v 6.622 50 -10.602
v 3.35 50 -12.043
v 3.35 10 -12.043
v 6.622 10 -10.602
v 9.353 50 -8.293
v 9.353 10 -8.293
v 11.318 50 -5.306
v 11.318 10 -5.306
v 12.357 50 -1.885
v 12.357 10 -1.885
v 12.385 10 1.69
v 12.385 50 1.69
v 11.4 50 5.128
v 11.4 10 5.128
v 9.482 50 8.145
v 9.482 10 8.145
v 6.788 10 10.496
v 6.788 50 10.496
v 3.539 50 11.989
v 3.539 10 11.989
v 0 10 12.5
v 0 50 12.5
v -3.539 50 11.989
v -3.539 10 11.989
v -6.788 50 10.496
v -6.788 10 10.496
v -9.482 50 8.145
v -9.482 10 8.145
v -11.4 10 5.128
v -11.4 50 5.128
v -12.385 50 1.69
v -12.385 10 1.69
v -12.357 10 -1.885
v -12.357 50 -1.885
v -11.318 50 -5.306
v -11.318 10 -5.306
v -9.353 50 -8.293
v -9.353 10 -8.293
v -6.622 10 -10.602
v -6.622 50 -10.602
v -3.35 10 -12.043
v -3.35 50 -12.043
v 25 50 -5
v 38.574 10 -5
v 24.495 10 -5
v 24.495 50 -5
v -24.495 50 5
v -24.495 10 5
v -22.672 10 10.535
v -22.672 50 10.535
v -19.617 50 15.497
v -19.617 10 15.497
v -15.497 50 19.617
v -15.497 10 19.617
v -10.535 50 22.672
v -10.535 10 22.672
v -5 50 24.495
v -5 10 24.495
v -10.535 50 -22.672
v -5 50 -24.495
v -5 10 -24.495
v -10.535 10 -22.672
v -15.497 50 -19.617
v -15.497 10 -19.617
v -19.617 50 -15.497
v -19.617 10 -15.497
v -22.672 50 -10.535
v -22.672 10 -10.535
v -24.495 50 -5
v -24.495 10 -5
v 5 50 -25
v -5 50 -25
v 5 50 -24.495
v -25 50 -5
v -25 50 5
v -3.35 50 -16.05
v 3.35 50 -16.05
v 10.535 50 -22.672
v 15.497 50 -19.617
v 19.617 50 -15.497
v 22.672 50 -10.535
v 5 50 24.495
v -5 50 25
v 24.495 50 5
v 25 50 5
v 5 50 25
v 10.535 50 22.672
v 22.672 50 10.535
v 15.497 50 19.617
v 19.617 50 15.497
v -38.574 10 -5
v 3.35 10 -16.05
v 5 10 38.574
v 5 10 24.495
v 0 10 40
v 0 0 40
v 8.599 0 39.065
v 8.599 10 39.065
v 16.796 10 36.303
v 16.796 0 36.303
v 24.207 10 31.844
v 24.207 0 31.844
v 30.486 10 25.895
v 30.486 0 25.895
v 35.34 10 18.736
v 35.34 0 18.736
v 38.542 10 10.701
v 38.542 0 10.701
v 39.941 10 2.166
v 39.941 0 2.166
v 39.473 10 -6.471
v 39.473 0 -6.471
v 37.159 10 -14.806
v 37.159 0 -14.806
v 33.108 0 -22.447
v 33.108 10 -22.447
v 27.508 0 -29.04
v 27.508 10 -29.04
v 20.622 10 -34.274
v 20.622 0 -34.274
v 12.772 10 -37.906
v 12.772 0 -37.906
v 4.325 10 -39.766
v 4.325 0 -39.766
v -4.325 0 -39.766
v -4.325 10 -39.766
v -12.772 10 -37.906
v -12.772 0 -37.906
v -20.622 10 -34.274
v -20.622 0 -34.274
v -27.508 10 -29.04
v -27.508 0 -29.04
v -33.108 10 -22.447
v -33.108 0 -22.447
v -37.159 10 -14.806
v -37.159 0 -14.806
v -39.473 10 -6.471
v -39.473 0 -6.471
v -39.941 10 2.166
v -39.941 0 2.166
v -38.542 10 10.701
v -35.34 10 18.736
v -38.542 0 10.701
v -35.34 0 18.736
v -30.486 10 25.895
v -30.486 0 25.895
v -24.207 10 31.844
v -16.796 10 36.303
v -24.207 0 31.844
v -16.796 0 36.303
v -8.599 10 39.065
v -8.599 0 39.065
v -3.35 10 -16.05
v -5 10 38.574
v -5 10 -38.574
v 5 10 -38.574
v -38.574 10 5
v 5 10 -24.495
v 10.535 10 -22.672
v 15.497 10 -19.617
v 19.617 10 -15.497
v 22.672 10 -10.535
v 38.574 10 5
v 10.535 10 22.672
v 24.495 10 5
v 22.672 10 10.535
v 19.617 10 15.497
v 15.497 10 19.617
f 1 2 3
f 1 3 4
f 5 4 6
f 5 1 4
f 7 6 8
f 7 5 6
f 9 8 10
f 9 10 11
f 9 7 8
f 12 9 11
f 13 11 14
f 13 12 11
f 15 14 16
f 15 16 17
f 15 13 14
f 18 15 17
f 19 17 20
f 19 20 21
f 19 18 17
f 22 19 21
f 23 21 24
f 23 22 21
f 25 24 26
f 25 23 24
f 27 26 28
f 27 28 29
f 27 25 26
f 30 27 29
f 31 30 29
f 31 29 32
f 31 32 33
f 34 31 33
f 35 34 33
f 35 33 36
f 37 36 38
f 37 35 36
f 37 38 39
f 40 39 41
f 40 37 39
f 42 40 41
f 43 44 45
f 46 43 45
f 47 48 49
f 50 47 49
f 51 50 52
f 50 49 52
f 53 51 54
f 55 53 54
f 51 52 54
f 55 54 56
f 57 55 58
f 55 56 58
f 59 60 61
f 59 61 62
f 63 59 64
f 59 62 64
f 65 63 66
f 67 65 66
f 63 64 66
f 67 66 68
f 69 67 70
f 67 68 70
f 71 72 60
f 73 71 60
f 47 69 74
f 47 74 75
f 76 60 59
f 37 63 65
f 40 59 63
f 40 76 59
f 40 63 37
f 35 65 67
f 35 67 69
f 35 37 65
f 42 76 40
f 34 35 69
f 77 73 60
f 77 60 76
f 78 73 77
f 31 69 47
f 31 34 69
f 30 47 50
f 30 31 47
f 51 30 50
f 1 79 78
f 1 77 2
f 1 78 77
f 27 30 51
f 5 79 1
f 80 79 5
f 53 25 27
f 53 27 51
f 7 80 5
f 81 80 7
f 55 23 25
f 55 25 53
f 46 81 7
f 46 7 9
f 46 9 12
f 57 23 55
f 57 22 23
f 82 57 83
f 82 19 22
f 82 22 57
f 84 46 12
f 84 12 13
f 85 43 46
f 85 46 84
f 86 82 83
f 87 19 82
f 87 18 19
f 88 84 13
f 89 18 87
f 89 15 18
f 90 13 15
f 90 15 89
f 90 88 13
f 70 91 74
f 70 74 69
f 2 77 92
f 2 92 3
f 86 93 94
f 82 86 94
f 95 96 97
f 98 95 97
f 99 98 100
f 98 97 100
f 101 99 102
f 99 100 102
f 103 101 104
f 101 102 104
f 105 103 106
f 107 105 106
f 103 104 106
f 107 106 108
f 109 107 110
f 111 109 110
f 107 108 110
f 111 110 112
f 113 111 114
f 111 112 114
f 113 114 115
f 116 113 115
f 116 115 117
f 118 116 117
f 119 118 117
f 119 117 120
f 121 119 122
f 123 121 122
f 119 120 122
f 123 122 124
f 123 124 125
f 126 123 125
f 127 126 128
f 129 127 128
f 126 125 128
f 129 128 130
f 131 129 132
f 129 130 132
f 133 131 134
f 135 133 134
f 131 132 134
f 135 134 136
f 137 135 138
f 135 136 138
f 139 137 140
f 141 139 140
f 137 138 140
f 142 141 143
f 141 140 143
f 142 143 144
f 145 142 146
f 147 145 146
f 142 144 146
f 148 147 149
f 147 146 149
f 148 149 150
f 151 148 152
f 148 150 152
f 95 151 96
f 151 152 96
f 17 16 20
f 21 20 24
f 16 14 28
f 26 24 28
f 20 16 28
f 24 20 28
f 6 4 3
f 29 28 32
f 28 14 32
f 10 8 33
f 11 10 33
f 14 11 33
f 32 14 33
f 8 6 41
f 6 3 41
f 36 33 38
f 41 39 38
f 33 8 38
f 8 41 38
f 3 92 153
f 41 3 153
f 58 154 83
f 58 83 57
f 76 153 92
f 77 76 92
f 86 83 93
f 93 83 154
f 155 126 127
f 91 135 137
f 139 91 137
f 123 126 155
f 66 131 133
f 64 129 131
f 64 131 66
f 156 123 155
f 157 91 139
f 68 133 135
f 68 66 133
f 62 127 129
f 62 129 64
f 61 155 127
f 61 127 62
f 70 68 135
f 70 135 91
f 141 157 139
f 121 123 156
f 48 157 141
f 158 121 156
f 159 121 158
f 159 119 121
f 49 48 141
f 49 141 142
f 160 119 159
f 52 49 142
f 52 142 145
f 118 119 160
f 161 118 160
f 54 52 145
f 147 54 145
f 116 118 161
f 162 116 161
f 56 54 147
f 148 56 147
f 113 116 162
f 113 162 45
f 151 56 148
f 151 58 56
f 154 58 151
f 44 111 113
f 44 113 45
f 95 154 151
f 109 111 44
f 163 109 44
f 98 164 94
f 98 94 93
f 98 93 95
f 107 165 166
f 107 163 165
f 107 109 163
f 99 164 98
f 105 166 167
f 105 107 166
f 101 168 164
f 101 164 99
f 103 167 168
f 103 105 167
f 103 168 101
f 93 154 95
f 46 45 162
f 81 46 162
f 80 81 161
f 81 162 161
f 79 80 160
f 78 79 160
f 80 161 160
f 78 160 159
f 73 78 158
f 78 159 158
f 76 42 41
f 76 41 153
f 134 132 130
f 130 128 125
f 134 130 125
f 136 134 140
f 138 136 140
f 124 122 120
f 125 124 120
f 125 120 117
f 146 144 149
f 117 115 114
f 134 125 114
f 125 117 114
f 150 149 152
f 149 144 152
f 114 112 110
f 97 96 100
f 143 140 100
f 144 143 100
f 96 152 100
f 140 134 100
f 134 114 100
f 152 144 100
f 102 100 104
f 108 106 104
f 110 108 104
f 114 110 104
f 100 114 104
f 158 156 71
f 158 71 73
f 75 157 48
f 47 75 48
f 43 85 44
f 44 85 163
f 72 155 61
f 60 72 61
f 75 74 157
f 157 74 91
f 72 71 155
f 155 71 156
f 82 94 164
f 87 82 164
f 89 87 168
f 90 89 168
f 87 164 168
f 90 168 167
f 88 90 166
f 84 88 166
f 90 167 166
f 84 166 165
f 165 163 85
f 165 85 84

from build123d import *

# Parameters (mm, degrees)
SCHIZZO1_R                   = 40
ESTRUSIONE_ESTRUSIONE1_DEPTH = 10
SCHIZZO2_R                   = 25
ESTRUSIONE_ESTRUSIONE2_DEPTH = 40
TAGLIO_ESTRUSIONE1_DEPTH     = 40
NERVATURA16_START            = -5
NERVATURA16_DEPTH            = 10
RIPETIZIONECIRCOLARE1_COUNT  = 4


with BuildPart() as part:
    # Schizzo1 → Estrusione-Estrusione1 (new body)
    with BuildSketch(Plane(origin=(0, 0, 0), x_dir=(1, 0, 0), z_dir=(0, 1, 0))):
        with Locations(Location((0, 0, 0), (0, 0, 270))):
            Circle(SCHIZZO1_R)
    extrude(amount=ESTRUSIONE_ESTRUSIONE1_DEPTH)

    # Schizzo2 → Estrusione-Estrusione2 (add)
    with BuildSketch(Plane(origin=(0, 10, 0), x_dir=(1, 0, 0), z_dir=(0, 1, 0))):
        with Locations(Location((0, 0, 0), (0, 0, 270))):
            Circle(SCHIZZO2_R)
    extrude(amount=ESTRUSIONE_ESTRUSIONE2_DEPTH)

    # Schizzo3 → Taglio-Estrusione1 (cut)
    with BuildSketch(Plane(origin=(0, 50, 0), x_dir=(1, 0, 0), z_dir=(0, 1, 0))):
        with BuildLine():
            Line((-3.349661481, 12.042830563), (-3.349661481, 16.050123743))
            Line((-3.349661481, 16.050123743), (3.349661481, 16.050123743))
            Line((3.349661481, 16.050123743), (3.349661481, 12.042830563))
            ThreePointArc((3.349661481, 12.042830563), (0, -12.5), (-3.349661481, 12.042830563))
        make_face()
    extrude(amount=-TAGLIO_ESTRUSIONE1_DEPTH, mode=Mode.SUBTRACT)

    # Nervatura16: read off the stored shape, not the designer's step
    # Nervatura16 outline → Nervatura16 (add)
    with BuildSketch(Plane(origin=(0, 0, 0), x_dir=(0, 0, -1), z_dir=(1, 0, 0)).offset(NERVATURA16_START)):
        Polygon((-24.494897428, 50), (-25, 50), (-38.573669022, 10), (-24.494897428, 10), align=None)
    nervatura16 = extrude(amount=NERVATURA16_DEPTH)

    # RipetizioneCircolare1: Nervatura16 ×4 about axis
    ripetizionecircolare1_axis = Axis((0, 0, 0), (0, 1, 0))
    for i in range(1, RIPETIZIONECIRCOLARE1_COUNT):
        add(nervatura16.rotate(ripetizionecircolare1_axis, i * 360 / RIPETIZIONECIRCOLARE1_COUNT))


solid = part.part
